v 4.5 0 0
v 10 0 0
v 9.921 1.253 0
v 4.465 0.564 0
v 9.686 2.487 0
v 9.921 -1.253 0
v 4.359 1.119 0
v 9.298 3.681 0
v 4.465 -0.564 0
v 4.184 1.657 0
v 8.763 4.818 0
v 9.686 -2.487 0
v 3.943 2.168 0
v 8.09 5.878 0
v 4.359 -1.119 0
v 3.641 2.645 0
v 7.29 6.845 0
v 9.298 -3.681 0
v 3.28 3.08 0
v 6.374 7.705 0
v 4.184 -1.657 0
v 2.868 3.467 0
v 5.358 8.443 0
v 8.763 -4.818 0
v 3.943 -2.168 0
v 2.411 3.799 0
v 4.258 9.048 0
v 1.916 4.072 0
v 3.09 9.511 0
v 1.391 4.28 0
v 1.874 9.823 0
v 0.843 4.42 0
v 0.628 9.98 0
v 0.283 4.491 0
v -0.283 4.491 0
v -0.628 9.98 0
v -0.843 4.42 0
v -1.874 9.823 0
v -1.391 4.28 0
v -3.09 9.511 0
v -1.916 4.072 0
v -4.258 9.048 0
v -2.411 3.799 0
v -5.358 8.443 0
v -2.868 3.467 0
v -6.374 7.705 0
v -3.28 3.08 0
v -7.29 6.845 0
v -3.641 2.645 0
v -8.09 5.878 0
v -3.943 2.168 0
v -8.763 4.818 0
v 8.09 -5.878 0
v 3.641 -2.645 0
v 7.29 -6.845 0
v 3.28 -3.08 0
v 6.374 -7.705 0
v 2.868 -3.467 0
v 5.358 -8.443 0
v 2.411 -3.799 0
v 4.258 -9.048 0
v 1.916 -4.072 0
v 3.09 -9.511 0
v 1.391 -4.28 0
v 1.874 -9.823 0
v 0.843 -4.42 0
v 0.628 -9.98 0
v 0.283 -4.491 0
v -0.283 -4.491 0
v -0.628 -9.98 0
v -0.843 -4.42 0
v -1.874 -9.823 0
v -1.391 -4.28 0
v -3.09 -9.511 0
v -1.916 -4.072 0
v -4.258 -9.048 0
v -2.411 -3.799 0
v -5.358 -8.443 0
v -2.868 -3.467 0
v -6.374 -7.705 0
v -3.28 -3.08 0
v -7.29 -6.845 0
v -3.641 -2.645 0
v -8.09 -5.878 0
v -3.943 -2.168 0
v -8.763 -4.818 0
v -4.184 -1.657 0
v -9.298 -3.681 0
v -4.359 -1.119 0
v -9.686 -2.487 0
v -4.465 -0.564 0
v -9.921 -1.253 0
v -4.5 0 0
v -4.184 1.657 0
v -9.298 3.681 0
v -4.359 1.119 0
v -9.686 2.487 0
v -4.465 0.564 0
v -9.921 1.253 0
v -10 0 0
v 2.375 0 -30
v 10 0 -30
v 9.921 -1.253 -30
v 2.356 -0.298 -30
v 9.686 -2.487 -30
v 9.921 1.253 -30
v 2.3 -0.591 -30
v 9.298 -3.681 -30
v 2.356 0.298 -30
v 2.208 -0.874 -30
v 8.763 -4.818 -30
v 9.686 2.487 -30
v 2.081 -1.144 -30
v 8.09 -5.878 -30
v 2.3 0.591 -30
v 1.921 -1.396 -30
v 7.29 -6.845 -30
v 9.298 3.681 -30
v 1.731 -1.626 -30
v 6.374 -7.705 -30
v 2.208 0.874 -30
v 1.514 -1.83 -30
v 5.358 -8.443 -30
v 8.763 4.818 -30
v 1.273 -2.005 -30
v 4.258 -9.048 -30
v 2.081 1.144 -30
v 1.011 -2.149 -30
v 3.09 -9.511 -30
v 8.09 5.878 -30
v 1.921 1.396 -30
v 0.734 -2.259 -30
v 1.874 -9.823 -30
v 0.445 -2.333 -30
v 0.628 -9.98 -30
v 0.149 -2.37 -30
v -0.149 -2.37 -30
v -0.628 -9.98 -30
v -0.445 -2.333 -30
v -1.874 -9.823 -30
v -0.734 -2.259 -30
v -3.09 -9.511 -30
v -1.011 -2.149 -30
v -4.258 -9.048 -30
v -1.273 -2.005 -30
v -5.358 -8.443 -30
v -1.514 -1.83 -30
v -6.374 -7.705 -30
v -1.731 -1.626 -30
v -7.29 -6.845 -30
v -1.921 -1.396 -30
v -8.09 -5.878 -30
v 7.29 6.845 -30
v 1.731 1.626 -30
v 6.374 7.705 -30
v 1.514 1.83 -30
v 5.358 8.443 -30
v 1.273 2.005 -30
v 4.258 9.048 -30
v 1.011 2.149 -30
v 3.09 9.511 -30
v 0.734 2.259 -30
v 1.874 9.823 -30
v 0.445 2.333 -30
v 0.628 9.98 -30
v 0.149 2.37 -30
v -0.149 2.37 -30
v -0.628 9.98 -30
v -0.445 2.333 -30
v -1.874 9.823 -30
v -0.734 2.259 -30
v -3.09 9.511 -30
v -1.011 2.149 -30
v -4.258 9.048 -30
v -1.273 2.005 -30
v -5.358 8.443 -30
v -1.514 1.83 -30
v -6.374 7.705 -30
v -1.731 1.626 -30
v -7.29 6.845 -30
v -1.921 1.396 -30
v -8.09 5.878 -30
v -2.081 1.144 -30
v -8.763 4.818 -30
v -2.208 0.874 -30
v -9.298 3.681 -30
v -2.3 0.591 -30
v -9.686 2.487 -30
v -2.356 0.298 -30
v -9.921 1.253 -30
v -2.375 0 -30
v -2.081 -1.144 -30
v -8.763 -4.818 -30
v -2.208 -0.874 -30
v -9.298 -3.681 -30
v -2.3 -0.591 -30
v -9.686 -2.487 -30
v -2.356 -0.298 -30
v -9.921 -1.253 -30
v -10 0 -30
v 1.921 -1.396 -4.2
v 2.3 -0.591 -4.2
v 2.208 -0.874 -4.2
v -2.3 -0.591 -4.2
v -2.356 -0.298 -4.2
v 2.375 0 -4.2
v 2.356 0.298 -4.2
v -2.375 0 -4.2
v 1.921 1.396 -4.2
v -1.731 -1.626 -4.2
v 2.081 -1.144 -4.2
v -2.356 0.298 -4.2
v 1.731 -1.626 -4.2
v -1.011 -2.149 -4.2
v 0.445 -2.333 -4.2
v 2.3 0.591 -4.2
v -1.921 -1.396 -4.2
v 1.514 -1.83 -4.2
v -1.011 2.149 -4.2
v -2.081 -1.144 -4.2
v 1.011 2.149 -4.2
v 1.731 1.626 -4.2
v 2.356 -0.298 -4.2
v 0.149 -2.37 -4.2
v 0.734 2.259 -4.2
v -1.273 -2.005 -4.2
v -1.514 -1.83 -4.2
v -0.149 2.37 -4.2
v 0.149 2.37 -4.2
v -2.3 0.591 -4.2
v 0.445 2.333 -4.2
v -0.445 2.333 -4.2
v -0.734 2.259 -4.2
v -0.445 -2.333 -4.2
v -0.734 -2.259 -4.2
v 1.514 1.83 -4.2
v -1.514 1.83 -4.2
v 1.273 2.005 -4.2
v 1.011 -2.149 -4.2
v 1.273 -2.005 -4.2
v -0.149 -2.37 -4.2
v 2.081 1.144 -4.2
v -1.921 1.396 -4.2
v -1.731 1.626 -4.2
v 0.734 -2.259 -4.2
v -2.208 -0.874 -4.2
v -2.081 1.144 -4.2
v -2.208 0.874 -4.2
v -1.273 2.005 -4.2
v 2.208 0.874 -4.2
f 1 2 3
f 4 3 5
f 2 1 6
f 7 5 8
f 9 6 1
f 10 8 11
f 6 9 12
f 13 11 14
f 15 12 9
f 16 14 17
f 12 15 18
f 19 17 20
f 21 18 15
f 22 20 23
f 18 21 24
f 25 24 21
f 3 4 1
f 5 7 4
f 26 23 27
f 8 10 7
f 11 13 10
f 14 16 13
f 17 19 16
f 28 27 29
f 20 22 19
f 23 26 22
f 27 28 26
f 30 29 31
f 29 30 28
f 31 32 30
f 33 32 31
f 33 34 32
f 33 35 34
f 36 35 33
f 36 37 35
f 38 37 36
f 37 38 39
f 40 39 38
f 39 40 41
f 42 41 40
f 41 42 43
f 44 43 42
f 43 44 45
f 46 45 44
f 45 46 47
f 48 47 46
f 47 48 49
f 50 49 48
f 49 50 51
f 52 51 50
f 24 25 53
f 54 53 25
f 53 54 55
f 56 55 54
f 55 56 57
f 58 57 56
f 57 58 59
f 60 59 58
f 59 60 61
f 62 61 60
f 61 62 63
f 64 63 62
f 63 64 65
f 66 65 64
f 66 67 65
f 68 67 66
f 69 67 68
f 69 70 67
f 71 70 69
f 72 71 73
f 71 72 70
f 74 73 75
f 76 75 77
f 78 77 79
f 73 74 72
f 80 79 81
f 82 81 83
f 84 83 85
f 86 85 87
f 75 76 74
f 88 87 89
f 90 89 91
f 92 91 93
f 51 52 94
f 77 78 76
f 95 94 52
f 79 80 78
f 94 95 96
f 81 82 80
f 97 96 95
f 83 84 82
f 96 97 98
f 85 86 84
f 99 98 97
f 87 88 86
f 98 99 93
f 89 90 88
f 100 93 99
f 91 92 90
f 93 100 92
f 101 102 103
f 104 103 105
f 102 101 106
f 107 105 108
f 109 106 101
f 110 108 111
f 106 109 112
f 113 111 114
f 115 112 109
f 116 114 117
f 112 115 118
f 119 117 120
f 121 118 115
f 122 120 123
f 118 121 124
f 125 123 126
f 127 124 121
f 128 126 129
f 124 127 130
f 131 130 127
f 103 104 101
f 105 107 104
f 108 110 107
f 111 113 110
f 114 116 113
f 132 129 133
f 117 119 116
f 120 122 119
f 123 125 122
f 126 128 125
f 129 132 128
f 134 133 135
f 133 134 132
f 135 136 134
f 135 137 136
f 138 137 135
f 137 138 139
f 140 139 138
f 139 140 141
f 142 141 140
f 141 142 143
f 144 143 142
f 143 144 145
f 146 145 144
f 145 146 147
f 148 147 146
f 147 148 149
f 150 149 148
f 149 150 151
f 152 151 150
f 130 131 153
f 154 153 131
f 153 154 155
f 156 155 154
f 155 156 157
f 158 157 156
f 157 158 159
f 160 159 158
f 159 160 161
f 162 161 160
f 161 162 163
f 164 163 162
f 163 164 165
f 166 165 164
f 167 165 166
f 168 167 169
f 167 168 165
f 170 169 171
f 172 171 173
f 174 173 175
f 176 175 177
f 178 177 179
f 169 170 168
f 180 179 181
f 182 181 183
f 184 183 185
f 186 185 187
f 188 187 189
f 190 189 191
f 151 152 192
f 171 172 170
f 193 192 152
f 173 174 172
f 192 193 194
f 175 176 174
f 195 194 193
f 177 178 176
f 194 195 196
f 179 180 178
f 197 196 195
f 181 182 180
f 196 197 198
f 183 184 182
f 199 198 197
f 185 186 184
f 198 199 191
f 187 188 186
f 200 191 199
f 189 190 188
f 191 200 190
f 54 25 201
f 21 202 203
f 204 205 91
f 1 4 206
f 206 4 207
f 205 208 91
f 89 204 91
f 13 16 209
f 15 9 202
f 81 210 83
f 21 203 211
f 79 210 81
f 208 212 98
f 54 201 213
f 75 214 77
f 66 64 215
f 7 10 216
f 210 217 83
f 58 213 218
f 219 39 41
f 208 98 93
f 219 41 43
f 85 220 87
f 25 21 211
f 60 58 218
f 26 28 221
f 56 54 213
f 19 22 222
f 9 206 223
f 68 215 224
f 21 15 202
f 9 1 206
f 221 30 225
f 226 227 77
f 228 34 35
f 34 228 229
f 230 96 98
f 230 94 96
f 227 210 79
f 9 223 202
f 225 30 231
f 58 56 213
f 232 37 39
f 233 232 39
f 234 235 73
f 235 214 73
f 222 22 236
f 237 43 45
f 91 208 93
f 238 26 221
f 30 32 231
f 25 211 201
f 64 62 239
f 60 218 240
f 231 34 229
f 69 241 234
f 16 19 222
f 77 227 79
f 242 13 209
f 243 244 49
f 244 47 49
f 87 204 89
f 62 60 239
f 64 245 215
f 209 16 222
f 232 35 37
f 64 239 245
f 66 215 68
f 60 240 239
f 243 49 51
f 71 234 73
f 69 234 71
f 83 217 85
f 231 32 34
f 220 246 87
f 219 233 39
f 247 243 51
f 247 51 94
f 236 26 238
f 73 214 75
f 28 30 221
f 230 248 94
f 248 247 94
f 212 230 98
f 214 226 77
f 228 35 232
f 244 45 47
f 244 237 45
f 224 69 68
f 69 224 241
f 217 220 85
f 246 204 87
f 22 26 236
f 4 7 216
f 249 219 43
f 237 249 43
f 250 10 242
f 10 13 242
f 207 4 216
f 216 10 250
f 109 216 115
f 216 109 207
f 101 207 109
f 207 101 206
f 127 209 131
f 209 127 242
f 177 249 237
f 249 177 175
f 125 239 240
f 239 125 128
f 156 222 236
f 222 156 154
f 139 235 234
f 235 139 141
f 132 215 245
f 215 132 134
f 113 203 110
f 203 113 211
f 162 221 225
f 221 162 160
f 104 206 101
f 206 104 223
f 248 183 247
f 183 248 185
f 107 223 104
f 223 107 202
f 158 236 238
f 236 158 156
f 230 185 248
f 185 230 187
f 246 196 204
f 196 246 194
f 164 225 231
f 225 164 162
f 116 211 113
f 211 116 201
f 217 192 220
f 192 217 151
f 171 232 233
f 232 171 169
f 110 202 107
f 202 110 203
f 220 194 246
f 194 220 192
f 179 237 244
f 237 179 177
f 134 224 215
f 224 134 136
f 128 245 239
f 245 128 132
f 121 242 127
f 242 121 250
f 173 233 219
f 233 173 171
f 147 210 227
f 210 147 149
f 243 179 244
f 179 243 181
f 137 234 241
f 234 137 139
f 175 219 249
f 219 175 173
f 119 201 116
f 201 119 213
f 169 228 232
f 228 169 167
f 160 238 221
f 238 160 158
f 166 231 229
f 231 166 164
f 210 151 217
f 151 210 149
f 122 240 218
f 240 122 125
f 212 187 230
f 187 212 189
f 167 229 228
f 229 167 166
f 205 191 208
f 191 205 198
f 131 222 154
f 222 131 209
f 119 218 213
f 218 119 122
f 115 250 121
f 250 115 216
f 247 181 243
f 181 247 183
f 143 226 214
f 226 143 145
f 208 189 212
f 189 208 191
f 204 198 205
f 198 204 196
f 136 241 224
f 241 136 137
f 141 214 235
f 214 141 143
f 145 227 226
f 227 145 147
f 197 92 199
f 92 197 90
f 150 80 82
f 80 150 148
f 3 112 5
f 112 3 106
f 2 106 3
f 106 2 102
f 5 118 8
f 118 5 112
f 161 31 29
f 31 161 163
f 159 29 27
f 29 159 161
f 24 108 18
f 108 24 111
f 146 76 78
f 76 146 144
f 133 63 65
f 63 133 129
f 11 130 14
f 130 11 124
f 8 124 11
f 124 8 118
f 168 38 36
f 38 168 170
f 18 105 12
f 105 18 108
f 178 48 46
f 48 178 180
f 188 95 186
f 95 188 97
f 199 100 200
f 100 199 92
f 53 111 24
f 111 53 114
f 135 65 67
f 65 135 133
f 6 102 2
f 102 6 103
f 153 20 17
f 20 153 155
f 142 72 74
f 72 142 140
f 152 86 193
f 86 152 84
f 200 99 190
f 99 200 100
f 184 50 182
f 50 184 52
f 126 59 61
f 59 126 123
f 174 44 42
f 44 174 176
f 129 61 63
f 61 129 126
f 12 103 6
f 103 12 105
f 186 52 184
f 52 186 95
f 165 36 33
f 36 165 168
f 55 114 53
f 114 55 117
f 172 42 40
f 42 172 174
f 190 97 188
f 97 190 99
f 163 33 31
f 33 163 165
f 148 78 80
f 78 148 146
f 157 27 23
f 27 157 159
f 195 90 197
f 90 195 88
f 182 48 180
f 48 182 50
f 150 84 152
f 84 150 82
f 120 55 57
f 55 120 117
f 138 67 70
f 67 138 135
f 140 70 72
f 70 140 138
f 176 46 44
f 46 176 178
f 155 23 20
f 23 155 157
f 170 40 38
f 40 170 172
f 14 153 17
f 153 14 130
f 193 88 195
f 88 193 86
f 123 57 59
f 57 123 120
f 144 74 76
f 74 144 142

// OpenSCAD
$fn = 50;


difference() {
	union() {
		translate(v = [0, 0, -30.0000000000]) {
			cylinder(h = 30, r = 10.0000000000);
		}
		cylinder(h = 0, r = 19.0000000000);
	}
	union() {
		translate(v = [0, 0, 0]) {
			rotate(a = [0, 0, 0]) {
				difference() {
					union() {
						#translate(v = [0, 0, -30.0000000000]) {
							cylinder(h = 30, r = 2.2500000000);
						}
						#translate(v = [0, 0, -4.2000000000]) {
							cylinder(h = 4.2000000000, r = 10.0000000000, r1 = 2.3750000000, r2 = 4.5000000000);
						}
						#translate(v = [0, 0, -30.0000000000]) {
							cylinder(h = 30, r = 2.3750000000);
						}
						#translate(v = [0, 0, -30.0000000000]) {
							cylinder(h = 30, r = 2.2500000000);
						}
					}
					union();
				}
			}
		}
	}
}
